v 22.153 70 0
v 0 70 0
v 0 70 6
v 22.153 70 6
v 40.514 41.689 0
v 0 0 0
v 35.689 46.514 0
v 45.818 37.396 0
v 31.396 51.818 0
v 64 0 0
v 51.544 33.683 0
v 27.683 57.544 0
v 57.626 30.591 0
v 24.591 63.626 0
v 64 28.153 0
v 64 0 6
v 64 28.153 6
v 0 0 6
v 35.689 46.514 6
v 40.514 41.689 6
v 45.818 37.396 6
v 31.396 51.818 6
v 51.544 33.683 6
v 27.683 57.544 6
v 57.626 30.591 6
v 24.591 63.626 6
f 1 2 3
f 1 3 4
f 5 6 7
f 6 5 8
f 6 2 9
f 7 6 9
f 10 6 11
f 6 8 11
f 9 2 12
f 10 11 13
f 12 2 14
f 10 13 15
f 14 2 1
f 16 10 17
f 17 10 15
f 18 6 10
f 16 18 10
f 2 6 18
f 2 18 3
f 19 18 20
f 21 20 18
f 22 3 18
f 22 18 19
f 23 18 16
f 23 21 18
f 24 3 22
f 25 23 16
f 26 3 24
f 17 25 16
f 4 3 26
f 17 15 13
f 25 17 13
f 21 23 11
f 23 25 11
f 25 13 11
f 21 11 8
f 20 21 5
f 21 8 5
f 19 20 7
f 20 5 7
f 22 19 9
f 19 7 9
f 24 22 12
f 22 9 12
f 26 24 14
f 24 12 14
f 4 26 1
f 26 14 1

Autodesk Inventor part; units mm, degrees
ref_plane "YZ Plane" through (0, 0, 0) normal (1, 0, 0) x (0, 1, 0)
ref_plane "XZ Plane" through (0, 0, 0) normal (0, 1, 0) x (-1, 0, 0)
ref_plane "XY Plane" through (0, 0, 0) normal (0, 0, 1) x (1, 0, 0)
sketch "Szkic1" plane through (0, 0, 0) normal (0, 0, 1) x (1, 0, 0)
  line L0 (0, 0) -> (64, 0) construction
  line L1 (64, 0) -> (64, 70) construction
  line L2 (64, 70) -> (0, 70) construction
  line L3 (0, 70) -> (0, 0) construction
  line L4 (0, 0) -> (6, 0) construction
  line L5 (6, 70) -> (0, 70) construction
  line L6 (0, 70) -> (0, 0) construction
  line L7 (6, 0) -> (174, 0) construction
  line L8 (0, 0) -> (64, 0) construction
  line L9 (64, 0) -> (64, 6) construction
  line L10 (64, 6) -> (0, 6) construction
  line L11 (0, 6) -> (0, 0) construction
  line L12 (0, 6) -> (168, 6) construction
  line L13 (168, 6) -> (168, 174) construction
  line L14 (168, 174) -> (0, 174) construction
  line L15 (0, 174) -> (0, 6) construction
  line L16 (84, 174) -> (84, 6) construction
  circle A0 centre (84, 90) radius 65 construction
  line L17 (0, 0) -> (64, 0)
  line L18 (64, 0) -> (64, 28.1534)
  line L19 (0, 0) -> (0, 70)
  line L20 (0, 70) -> (22.1534, 70)
  arc A1 (22.1534, 70) -> (64, 28.1534) centre (84, 90) ccw
  dimension "d13" = 64
  dimension "d14" = 70
  dimension "d19" = 6
  dimension "d20" = 168
  dimension "d21" = 168
  dimension "d22" = 130
extrude "Wyciągnięcie proste1" add sketch "Szkic1" along normal blind 6
properties part number "Naroznik_60x54"
